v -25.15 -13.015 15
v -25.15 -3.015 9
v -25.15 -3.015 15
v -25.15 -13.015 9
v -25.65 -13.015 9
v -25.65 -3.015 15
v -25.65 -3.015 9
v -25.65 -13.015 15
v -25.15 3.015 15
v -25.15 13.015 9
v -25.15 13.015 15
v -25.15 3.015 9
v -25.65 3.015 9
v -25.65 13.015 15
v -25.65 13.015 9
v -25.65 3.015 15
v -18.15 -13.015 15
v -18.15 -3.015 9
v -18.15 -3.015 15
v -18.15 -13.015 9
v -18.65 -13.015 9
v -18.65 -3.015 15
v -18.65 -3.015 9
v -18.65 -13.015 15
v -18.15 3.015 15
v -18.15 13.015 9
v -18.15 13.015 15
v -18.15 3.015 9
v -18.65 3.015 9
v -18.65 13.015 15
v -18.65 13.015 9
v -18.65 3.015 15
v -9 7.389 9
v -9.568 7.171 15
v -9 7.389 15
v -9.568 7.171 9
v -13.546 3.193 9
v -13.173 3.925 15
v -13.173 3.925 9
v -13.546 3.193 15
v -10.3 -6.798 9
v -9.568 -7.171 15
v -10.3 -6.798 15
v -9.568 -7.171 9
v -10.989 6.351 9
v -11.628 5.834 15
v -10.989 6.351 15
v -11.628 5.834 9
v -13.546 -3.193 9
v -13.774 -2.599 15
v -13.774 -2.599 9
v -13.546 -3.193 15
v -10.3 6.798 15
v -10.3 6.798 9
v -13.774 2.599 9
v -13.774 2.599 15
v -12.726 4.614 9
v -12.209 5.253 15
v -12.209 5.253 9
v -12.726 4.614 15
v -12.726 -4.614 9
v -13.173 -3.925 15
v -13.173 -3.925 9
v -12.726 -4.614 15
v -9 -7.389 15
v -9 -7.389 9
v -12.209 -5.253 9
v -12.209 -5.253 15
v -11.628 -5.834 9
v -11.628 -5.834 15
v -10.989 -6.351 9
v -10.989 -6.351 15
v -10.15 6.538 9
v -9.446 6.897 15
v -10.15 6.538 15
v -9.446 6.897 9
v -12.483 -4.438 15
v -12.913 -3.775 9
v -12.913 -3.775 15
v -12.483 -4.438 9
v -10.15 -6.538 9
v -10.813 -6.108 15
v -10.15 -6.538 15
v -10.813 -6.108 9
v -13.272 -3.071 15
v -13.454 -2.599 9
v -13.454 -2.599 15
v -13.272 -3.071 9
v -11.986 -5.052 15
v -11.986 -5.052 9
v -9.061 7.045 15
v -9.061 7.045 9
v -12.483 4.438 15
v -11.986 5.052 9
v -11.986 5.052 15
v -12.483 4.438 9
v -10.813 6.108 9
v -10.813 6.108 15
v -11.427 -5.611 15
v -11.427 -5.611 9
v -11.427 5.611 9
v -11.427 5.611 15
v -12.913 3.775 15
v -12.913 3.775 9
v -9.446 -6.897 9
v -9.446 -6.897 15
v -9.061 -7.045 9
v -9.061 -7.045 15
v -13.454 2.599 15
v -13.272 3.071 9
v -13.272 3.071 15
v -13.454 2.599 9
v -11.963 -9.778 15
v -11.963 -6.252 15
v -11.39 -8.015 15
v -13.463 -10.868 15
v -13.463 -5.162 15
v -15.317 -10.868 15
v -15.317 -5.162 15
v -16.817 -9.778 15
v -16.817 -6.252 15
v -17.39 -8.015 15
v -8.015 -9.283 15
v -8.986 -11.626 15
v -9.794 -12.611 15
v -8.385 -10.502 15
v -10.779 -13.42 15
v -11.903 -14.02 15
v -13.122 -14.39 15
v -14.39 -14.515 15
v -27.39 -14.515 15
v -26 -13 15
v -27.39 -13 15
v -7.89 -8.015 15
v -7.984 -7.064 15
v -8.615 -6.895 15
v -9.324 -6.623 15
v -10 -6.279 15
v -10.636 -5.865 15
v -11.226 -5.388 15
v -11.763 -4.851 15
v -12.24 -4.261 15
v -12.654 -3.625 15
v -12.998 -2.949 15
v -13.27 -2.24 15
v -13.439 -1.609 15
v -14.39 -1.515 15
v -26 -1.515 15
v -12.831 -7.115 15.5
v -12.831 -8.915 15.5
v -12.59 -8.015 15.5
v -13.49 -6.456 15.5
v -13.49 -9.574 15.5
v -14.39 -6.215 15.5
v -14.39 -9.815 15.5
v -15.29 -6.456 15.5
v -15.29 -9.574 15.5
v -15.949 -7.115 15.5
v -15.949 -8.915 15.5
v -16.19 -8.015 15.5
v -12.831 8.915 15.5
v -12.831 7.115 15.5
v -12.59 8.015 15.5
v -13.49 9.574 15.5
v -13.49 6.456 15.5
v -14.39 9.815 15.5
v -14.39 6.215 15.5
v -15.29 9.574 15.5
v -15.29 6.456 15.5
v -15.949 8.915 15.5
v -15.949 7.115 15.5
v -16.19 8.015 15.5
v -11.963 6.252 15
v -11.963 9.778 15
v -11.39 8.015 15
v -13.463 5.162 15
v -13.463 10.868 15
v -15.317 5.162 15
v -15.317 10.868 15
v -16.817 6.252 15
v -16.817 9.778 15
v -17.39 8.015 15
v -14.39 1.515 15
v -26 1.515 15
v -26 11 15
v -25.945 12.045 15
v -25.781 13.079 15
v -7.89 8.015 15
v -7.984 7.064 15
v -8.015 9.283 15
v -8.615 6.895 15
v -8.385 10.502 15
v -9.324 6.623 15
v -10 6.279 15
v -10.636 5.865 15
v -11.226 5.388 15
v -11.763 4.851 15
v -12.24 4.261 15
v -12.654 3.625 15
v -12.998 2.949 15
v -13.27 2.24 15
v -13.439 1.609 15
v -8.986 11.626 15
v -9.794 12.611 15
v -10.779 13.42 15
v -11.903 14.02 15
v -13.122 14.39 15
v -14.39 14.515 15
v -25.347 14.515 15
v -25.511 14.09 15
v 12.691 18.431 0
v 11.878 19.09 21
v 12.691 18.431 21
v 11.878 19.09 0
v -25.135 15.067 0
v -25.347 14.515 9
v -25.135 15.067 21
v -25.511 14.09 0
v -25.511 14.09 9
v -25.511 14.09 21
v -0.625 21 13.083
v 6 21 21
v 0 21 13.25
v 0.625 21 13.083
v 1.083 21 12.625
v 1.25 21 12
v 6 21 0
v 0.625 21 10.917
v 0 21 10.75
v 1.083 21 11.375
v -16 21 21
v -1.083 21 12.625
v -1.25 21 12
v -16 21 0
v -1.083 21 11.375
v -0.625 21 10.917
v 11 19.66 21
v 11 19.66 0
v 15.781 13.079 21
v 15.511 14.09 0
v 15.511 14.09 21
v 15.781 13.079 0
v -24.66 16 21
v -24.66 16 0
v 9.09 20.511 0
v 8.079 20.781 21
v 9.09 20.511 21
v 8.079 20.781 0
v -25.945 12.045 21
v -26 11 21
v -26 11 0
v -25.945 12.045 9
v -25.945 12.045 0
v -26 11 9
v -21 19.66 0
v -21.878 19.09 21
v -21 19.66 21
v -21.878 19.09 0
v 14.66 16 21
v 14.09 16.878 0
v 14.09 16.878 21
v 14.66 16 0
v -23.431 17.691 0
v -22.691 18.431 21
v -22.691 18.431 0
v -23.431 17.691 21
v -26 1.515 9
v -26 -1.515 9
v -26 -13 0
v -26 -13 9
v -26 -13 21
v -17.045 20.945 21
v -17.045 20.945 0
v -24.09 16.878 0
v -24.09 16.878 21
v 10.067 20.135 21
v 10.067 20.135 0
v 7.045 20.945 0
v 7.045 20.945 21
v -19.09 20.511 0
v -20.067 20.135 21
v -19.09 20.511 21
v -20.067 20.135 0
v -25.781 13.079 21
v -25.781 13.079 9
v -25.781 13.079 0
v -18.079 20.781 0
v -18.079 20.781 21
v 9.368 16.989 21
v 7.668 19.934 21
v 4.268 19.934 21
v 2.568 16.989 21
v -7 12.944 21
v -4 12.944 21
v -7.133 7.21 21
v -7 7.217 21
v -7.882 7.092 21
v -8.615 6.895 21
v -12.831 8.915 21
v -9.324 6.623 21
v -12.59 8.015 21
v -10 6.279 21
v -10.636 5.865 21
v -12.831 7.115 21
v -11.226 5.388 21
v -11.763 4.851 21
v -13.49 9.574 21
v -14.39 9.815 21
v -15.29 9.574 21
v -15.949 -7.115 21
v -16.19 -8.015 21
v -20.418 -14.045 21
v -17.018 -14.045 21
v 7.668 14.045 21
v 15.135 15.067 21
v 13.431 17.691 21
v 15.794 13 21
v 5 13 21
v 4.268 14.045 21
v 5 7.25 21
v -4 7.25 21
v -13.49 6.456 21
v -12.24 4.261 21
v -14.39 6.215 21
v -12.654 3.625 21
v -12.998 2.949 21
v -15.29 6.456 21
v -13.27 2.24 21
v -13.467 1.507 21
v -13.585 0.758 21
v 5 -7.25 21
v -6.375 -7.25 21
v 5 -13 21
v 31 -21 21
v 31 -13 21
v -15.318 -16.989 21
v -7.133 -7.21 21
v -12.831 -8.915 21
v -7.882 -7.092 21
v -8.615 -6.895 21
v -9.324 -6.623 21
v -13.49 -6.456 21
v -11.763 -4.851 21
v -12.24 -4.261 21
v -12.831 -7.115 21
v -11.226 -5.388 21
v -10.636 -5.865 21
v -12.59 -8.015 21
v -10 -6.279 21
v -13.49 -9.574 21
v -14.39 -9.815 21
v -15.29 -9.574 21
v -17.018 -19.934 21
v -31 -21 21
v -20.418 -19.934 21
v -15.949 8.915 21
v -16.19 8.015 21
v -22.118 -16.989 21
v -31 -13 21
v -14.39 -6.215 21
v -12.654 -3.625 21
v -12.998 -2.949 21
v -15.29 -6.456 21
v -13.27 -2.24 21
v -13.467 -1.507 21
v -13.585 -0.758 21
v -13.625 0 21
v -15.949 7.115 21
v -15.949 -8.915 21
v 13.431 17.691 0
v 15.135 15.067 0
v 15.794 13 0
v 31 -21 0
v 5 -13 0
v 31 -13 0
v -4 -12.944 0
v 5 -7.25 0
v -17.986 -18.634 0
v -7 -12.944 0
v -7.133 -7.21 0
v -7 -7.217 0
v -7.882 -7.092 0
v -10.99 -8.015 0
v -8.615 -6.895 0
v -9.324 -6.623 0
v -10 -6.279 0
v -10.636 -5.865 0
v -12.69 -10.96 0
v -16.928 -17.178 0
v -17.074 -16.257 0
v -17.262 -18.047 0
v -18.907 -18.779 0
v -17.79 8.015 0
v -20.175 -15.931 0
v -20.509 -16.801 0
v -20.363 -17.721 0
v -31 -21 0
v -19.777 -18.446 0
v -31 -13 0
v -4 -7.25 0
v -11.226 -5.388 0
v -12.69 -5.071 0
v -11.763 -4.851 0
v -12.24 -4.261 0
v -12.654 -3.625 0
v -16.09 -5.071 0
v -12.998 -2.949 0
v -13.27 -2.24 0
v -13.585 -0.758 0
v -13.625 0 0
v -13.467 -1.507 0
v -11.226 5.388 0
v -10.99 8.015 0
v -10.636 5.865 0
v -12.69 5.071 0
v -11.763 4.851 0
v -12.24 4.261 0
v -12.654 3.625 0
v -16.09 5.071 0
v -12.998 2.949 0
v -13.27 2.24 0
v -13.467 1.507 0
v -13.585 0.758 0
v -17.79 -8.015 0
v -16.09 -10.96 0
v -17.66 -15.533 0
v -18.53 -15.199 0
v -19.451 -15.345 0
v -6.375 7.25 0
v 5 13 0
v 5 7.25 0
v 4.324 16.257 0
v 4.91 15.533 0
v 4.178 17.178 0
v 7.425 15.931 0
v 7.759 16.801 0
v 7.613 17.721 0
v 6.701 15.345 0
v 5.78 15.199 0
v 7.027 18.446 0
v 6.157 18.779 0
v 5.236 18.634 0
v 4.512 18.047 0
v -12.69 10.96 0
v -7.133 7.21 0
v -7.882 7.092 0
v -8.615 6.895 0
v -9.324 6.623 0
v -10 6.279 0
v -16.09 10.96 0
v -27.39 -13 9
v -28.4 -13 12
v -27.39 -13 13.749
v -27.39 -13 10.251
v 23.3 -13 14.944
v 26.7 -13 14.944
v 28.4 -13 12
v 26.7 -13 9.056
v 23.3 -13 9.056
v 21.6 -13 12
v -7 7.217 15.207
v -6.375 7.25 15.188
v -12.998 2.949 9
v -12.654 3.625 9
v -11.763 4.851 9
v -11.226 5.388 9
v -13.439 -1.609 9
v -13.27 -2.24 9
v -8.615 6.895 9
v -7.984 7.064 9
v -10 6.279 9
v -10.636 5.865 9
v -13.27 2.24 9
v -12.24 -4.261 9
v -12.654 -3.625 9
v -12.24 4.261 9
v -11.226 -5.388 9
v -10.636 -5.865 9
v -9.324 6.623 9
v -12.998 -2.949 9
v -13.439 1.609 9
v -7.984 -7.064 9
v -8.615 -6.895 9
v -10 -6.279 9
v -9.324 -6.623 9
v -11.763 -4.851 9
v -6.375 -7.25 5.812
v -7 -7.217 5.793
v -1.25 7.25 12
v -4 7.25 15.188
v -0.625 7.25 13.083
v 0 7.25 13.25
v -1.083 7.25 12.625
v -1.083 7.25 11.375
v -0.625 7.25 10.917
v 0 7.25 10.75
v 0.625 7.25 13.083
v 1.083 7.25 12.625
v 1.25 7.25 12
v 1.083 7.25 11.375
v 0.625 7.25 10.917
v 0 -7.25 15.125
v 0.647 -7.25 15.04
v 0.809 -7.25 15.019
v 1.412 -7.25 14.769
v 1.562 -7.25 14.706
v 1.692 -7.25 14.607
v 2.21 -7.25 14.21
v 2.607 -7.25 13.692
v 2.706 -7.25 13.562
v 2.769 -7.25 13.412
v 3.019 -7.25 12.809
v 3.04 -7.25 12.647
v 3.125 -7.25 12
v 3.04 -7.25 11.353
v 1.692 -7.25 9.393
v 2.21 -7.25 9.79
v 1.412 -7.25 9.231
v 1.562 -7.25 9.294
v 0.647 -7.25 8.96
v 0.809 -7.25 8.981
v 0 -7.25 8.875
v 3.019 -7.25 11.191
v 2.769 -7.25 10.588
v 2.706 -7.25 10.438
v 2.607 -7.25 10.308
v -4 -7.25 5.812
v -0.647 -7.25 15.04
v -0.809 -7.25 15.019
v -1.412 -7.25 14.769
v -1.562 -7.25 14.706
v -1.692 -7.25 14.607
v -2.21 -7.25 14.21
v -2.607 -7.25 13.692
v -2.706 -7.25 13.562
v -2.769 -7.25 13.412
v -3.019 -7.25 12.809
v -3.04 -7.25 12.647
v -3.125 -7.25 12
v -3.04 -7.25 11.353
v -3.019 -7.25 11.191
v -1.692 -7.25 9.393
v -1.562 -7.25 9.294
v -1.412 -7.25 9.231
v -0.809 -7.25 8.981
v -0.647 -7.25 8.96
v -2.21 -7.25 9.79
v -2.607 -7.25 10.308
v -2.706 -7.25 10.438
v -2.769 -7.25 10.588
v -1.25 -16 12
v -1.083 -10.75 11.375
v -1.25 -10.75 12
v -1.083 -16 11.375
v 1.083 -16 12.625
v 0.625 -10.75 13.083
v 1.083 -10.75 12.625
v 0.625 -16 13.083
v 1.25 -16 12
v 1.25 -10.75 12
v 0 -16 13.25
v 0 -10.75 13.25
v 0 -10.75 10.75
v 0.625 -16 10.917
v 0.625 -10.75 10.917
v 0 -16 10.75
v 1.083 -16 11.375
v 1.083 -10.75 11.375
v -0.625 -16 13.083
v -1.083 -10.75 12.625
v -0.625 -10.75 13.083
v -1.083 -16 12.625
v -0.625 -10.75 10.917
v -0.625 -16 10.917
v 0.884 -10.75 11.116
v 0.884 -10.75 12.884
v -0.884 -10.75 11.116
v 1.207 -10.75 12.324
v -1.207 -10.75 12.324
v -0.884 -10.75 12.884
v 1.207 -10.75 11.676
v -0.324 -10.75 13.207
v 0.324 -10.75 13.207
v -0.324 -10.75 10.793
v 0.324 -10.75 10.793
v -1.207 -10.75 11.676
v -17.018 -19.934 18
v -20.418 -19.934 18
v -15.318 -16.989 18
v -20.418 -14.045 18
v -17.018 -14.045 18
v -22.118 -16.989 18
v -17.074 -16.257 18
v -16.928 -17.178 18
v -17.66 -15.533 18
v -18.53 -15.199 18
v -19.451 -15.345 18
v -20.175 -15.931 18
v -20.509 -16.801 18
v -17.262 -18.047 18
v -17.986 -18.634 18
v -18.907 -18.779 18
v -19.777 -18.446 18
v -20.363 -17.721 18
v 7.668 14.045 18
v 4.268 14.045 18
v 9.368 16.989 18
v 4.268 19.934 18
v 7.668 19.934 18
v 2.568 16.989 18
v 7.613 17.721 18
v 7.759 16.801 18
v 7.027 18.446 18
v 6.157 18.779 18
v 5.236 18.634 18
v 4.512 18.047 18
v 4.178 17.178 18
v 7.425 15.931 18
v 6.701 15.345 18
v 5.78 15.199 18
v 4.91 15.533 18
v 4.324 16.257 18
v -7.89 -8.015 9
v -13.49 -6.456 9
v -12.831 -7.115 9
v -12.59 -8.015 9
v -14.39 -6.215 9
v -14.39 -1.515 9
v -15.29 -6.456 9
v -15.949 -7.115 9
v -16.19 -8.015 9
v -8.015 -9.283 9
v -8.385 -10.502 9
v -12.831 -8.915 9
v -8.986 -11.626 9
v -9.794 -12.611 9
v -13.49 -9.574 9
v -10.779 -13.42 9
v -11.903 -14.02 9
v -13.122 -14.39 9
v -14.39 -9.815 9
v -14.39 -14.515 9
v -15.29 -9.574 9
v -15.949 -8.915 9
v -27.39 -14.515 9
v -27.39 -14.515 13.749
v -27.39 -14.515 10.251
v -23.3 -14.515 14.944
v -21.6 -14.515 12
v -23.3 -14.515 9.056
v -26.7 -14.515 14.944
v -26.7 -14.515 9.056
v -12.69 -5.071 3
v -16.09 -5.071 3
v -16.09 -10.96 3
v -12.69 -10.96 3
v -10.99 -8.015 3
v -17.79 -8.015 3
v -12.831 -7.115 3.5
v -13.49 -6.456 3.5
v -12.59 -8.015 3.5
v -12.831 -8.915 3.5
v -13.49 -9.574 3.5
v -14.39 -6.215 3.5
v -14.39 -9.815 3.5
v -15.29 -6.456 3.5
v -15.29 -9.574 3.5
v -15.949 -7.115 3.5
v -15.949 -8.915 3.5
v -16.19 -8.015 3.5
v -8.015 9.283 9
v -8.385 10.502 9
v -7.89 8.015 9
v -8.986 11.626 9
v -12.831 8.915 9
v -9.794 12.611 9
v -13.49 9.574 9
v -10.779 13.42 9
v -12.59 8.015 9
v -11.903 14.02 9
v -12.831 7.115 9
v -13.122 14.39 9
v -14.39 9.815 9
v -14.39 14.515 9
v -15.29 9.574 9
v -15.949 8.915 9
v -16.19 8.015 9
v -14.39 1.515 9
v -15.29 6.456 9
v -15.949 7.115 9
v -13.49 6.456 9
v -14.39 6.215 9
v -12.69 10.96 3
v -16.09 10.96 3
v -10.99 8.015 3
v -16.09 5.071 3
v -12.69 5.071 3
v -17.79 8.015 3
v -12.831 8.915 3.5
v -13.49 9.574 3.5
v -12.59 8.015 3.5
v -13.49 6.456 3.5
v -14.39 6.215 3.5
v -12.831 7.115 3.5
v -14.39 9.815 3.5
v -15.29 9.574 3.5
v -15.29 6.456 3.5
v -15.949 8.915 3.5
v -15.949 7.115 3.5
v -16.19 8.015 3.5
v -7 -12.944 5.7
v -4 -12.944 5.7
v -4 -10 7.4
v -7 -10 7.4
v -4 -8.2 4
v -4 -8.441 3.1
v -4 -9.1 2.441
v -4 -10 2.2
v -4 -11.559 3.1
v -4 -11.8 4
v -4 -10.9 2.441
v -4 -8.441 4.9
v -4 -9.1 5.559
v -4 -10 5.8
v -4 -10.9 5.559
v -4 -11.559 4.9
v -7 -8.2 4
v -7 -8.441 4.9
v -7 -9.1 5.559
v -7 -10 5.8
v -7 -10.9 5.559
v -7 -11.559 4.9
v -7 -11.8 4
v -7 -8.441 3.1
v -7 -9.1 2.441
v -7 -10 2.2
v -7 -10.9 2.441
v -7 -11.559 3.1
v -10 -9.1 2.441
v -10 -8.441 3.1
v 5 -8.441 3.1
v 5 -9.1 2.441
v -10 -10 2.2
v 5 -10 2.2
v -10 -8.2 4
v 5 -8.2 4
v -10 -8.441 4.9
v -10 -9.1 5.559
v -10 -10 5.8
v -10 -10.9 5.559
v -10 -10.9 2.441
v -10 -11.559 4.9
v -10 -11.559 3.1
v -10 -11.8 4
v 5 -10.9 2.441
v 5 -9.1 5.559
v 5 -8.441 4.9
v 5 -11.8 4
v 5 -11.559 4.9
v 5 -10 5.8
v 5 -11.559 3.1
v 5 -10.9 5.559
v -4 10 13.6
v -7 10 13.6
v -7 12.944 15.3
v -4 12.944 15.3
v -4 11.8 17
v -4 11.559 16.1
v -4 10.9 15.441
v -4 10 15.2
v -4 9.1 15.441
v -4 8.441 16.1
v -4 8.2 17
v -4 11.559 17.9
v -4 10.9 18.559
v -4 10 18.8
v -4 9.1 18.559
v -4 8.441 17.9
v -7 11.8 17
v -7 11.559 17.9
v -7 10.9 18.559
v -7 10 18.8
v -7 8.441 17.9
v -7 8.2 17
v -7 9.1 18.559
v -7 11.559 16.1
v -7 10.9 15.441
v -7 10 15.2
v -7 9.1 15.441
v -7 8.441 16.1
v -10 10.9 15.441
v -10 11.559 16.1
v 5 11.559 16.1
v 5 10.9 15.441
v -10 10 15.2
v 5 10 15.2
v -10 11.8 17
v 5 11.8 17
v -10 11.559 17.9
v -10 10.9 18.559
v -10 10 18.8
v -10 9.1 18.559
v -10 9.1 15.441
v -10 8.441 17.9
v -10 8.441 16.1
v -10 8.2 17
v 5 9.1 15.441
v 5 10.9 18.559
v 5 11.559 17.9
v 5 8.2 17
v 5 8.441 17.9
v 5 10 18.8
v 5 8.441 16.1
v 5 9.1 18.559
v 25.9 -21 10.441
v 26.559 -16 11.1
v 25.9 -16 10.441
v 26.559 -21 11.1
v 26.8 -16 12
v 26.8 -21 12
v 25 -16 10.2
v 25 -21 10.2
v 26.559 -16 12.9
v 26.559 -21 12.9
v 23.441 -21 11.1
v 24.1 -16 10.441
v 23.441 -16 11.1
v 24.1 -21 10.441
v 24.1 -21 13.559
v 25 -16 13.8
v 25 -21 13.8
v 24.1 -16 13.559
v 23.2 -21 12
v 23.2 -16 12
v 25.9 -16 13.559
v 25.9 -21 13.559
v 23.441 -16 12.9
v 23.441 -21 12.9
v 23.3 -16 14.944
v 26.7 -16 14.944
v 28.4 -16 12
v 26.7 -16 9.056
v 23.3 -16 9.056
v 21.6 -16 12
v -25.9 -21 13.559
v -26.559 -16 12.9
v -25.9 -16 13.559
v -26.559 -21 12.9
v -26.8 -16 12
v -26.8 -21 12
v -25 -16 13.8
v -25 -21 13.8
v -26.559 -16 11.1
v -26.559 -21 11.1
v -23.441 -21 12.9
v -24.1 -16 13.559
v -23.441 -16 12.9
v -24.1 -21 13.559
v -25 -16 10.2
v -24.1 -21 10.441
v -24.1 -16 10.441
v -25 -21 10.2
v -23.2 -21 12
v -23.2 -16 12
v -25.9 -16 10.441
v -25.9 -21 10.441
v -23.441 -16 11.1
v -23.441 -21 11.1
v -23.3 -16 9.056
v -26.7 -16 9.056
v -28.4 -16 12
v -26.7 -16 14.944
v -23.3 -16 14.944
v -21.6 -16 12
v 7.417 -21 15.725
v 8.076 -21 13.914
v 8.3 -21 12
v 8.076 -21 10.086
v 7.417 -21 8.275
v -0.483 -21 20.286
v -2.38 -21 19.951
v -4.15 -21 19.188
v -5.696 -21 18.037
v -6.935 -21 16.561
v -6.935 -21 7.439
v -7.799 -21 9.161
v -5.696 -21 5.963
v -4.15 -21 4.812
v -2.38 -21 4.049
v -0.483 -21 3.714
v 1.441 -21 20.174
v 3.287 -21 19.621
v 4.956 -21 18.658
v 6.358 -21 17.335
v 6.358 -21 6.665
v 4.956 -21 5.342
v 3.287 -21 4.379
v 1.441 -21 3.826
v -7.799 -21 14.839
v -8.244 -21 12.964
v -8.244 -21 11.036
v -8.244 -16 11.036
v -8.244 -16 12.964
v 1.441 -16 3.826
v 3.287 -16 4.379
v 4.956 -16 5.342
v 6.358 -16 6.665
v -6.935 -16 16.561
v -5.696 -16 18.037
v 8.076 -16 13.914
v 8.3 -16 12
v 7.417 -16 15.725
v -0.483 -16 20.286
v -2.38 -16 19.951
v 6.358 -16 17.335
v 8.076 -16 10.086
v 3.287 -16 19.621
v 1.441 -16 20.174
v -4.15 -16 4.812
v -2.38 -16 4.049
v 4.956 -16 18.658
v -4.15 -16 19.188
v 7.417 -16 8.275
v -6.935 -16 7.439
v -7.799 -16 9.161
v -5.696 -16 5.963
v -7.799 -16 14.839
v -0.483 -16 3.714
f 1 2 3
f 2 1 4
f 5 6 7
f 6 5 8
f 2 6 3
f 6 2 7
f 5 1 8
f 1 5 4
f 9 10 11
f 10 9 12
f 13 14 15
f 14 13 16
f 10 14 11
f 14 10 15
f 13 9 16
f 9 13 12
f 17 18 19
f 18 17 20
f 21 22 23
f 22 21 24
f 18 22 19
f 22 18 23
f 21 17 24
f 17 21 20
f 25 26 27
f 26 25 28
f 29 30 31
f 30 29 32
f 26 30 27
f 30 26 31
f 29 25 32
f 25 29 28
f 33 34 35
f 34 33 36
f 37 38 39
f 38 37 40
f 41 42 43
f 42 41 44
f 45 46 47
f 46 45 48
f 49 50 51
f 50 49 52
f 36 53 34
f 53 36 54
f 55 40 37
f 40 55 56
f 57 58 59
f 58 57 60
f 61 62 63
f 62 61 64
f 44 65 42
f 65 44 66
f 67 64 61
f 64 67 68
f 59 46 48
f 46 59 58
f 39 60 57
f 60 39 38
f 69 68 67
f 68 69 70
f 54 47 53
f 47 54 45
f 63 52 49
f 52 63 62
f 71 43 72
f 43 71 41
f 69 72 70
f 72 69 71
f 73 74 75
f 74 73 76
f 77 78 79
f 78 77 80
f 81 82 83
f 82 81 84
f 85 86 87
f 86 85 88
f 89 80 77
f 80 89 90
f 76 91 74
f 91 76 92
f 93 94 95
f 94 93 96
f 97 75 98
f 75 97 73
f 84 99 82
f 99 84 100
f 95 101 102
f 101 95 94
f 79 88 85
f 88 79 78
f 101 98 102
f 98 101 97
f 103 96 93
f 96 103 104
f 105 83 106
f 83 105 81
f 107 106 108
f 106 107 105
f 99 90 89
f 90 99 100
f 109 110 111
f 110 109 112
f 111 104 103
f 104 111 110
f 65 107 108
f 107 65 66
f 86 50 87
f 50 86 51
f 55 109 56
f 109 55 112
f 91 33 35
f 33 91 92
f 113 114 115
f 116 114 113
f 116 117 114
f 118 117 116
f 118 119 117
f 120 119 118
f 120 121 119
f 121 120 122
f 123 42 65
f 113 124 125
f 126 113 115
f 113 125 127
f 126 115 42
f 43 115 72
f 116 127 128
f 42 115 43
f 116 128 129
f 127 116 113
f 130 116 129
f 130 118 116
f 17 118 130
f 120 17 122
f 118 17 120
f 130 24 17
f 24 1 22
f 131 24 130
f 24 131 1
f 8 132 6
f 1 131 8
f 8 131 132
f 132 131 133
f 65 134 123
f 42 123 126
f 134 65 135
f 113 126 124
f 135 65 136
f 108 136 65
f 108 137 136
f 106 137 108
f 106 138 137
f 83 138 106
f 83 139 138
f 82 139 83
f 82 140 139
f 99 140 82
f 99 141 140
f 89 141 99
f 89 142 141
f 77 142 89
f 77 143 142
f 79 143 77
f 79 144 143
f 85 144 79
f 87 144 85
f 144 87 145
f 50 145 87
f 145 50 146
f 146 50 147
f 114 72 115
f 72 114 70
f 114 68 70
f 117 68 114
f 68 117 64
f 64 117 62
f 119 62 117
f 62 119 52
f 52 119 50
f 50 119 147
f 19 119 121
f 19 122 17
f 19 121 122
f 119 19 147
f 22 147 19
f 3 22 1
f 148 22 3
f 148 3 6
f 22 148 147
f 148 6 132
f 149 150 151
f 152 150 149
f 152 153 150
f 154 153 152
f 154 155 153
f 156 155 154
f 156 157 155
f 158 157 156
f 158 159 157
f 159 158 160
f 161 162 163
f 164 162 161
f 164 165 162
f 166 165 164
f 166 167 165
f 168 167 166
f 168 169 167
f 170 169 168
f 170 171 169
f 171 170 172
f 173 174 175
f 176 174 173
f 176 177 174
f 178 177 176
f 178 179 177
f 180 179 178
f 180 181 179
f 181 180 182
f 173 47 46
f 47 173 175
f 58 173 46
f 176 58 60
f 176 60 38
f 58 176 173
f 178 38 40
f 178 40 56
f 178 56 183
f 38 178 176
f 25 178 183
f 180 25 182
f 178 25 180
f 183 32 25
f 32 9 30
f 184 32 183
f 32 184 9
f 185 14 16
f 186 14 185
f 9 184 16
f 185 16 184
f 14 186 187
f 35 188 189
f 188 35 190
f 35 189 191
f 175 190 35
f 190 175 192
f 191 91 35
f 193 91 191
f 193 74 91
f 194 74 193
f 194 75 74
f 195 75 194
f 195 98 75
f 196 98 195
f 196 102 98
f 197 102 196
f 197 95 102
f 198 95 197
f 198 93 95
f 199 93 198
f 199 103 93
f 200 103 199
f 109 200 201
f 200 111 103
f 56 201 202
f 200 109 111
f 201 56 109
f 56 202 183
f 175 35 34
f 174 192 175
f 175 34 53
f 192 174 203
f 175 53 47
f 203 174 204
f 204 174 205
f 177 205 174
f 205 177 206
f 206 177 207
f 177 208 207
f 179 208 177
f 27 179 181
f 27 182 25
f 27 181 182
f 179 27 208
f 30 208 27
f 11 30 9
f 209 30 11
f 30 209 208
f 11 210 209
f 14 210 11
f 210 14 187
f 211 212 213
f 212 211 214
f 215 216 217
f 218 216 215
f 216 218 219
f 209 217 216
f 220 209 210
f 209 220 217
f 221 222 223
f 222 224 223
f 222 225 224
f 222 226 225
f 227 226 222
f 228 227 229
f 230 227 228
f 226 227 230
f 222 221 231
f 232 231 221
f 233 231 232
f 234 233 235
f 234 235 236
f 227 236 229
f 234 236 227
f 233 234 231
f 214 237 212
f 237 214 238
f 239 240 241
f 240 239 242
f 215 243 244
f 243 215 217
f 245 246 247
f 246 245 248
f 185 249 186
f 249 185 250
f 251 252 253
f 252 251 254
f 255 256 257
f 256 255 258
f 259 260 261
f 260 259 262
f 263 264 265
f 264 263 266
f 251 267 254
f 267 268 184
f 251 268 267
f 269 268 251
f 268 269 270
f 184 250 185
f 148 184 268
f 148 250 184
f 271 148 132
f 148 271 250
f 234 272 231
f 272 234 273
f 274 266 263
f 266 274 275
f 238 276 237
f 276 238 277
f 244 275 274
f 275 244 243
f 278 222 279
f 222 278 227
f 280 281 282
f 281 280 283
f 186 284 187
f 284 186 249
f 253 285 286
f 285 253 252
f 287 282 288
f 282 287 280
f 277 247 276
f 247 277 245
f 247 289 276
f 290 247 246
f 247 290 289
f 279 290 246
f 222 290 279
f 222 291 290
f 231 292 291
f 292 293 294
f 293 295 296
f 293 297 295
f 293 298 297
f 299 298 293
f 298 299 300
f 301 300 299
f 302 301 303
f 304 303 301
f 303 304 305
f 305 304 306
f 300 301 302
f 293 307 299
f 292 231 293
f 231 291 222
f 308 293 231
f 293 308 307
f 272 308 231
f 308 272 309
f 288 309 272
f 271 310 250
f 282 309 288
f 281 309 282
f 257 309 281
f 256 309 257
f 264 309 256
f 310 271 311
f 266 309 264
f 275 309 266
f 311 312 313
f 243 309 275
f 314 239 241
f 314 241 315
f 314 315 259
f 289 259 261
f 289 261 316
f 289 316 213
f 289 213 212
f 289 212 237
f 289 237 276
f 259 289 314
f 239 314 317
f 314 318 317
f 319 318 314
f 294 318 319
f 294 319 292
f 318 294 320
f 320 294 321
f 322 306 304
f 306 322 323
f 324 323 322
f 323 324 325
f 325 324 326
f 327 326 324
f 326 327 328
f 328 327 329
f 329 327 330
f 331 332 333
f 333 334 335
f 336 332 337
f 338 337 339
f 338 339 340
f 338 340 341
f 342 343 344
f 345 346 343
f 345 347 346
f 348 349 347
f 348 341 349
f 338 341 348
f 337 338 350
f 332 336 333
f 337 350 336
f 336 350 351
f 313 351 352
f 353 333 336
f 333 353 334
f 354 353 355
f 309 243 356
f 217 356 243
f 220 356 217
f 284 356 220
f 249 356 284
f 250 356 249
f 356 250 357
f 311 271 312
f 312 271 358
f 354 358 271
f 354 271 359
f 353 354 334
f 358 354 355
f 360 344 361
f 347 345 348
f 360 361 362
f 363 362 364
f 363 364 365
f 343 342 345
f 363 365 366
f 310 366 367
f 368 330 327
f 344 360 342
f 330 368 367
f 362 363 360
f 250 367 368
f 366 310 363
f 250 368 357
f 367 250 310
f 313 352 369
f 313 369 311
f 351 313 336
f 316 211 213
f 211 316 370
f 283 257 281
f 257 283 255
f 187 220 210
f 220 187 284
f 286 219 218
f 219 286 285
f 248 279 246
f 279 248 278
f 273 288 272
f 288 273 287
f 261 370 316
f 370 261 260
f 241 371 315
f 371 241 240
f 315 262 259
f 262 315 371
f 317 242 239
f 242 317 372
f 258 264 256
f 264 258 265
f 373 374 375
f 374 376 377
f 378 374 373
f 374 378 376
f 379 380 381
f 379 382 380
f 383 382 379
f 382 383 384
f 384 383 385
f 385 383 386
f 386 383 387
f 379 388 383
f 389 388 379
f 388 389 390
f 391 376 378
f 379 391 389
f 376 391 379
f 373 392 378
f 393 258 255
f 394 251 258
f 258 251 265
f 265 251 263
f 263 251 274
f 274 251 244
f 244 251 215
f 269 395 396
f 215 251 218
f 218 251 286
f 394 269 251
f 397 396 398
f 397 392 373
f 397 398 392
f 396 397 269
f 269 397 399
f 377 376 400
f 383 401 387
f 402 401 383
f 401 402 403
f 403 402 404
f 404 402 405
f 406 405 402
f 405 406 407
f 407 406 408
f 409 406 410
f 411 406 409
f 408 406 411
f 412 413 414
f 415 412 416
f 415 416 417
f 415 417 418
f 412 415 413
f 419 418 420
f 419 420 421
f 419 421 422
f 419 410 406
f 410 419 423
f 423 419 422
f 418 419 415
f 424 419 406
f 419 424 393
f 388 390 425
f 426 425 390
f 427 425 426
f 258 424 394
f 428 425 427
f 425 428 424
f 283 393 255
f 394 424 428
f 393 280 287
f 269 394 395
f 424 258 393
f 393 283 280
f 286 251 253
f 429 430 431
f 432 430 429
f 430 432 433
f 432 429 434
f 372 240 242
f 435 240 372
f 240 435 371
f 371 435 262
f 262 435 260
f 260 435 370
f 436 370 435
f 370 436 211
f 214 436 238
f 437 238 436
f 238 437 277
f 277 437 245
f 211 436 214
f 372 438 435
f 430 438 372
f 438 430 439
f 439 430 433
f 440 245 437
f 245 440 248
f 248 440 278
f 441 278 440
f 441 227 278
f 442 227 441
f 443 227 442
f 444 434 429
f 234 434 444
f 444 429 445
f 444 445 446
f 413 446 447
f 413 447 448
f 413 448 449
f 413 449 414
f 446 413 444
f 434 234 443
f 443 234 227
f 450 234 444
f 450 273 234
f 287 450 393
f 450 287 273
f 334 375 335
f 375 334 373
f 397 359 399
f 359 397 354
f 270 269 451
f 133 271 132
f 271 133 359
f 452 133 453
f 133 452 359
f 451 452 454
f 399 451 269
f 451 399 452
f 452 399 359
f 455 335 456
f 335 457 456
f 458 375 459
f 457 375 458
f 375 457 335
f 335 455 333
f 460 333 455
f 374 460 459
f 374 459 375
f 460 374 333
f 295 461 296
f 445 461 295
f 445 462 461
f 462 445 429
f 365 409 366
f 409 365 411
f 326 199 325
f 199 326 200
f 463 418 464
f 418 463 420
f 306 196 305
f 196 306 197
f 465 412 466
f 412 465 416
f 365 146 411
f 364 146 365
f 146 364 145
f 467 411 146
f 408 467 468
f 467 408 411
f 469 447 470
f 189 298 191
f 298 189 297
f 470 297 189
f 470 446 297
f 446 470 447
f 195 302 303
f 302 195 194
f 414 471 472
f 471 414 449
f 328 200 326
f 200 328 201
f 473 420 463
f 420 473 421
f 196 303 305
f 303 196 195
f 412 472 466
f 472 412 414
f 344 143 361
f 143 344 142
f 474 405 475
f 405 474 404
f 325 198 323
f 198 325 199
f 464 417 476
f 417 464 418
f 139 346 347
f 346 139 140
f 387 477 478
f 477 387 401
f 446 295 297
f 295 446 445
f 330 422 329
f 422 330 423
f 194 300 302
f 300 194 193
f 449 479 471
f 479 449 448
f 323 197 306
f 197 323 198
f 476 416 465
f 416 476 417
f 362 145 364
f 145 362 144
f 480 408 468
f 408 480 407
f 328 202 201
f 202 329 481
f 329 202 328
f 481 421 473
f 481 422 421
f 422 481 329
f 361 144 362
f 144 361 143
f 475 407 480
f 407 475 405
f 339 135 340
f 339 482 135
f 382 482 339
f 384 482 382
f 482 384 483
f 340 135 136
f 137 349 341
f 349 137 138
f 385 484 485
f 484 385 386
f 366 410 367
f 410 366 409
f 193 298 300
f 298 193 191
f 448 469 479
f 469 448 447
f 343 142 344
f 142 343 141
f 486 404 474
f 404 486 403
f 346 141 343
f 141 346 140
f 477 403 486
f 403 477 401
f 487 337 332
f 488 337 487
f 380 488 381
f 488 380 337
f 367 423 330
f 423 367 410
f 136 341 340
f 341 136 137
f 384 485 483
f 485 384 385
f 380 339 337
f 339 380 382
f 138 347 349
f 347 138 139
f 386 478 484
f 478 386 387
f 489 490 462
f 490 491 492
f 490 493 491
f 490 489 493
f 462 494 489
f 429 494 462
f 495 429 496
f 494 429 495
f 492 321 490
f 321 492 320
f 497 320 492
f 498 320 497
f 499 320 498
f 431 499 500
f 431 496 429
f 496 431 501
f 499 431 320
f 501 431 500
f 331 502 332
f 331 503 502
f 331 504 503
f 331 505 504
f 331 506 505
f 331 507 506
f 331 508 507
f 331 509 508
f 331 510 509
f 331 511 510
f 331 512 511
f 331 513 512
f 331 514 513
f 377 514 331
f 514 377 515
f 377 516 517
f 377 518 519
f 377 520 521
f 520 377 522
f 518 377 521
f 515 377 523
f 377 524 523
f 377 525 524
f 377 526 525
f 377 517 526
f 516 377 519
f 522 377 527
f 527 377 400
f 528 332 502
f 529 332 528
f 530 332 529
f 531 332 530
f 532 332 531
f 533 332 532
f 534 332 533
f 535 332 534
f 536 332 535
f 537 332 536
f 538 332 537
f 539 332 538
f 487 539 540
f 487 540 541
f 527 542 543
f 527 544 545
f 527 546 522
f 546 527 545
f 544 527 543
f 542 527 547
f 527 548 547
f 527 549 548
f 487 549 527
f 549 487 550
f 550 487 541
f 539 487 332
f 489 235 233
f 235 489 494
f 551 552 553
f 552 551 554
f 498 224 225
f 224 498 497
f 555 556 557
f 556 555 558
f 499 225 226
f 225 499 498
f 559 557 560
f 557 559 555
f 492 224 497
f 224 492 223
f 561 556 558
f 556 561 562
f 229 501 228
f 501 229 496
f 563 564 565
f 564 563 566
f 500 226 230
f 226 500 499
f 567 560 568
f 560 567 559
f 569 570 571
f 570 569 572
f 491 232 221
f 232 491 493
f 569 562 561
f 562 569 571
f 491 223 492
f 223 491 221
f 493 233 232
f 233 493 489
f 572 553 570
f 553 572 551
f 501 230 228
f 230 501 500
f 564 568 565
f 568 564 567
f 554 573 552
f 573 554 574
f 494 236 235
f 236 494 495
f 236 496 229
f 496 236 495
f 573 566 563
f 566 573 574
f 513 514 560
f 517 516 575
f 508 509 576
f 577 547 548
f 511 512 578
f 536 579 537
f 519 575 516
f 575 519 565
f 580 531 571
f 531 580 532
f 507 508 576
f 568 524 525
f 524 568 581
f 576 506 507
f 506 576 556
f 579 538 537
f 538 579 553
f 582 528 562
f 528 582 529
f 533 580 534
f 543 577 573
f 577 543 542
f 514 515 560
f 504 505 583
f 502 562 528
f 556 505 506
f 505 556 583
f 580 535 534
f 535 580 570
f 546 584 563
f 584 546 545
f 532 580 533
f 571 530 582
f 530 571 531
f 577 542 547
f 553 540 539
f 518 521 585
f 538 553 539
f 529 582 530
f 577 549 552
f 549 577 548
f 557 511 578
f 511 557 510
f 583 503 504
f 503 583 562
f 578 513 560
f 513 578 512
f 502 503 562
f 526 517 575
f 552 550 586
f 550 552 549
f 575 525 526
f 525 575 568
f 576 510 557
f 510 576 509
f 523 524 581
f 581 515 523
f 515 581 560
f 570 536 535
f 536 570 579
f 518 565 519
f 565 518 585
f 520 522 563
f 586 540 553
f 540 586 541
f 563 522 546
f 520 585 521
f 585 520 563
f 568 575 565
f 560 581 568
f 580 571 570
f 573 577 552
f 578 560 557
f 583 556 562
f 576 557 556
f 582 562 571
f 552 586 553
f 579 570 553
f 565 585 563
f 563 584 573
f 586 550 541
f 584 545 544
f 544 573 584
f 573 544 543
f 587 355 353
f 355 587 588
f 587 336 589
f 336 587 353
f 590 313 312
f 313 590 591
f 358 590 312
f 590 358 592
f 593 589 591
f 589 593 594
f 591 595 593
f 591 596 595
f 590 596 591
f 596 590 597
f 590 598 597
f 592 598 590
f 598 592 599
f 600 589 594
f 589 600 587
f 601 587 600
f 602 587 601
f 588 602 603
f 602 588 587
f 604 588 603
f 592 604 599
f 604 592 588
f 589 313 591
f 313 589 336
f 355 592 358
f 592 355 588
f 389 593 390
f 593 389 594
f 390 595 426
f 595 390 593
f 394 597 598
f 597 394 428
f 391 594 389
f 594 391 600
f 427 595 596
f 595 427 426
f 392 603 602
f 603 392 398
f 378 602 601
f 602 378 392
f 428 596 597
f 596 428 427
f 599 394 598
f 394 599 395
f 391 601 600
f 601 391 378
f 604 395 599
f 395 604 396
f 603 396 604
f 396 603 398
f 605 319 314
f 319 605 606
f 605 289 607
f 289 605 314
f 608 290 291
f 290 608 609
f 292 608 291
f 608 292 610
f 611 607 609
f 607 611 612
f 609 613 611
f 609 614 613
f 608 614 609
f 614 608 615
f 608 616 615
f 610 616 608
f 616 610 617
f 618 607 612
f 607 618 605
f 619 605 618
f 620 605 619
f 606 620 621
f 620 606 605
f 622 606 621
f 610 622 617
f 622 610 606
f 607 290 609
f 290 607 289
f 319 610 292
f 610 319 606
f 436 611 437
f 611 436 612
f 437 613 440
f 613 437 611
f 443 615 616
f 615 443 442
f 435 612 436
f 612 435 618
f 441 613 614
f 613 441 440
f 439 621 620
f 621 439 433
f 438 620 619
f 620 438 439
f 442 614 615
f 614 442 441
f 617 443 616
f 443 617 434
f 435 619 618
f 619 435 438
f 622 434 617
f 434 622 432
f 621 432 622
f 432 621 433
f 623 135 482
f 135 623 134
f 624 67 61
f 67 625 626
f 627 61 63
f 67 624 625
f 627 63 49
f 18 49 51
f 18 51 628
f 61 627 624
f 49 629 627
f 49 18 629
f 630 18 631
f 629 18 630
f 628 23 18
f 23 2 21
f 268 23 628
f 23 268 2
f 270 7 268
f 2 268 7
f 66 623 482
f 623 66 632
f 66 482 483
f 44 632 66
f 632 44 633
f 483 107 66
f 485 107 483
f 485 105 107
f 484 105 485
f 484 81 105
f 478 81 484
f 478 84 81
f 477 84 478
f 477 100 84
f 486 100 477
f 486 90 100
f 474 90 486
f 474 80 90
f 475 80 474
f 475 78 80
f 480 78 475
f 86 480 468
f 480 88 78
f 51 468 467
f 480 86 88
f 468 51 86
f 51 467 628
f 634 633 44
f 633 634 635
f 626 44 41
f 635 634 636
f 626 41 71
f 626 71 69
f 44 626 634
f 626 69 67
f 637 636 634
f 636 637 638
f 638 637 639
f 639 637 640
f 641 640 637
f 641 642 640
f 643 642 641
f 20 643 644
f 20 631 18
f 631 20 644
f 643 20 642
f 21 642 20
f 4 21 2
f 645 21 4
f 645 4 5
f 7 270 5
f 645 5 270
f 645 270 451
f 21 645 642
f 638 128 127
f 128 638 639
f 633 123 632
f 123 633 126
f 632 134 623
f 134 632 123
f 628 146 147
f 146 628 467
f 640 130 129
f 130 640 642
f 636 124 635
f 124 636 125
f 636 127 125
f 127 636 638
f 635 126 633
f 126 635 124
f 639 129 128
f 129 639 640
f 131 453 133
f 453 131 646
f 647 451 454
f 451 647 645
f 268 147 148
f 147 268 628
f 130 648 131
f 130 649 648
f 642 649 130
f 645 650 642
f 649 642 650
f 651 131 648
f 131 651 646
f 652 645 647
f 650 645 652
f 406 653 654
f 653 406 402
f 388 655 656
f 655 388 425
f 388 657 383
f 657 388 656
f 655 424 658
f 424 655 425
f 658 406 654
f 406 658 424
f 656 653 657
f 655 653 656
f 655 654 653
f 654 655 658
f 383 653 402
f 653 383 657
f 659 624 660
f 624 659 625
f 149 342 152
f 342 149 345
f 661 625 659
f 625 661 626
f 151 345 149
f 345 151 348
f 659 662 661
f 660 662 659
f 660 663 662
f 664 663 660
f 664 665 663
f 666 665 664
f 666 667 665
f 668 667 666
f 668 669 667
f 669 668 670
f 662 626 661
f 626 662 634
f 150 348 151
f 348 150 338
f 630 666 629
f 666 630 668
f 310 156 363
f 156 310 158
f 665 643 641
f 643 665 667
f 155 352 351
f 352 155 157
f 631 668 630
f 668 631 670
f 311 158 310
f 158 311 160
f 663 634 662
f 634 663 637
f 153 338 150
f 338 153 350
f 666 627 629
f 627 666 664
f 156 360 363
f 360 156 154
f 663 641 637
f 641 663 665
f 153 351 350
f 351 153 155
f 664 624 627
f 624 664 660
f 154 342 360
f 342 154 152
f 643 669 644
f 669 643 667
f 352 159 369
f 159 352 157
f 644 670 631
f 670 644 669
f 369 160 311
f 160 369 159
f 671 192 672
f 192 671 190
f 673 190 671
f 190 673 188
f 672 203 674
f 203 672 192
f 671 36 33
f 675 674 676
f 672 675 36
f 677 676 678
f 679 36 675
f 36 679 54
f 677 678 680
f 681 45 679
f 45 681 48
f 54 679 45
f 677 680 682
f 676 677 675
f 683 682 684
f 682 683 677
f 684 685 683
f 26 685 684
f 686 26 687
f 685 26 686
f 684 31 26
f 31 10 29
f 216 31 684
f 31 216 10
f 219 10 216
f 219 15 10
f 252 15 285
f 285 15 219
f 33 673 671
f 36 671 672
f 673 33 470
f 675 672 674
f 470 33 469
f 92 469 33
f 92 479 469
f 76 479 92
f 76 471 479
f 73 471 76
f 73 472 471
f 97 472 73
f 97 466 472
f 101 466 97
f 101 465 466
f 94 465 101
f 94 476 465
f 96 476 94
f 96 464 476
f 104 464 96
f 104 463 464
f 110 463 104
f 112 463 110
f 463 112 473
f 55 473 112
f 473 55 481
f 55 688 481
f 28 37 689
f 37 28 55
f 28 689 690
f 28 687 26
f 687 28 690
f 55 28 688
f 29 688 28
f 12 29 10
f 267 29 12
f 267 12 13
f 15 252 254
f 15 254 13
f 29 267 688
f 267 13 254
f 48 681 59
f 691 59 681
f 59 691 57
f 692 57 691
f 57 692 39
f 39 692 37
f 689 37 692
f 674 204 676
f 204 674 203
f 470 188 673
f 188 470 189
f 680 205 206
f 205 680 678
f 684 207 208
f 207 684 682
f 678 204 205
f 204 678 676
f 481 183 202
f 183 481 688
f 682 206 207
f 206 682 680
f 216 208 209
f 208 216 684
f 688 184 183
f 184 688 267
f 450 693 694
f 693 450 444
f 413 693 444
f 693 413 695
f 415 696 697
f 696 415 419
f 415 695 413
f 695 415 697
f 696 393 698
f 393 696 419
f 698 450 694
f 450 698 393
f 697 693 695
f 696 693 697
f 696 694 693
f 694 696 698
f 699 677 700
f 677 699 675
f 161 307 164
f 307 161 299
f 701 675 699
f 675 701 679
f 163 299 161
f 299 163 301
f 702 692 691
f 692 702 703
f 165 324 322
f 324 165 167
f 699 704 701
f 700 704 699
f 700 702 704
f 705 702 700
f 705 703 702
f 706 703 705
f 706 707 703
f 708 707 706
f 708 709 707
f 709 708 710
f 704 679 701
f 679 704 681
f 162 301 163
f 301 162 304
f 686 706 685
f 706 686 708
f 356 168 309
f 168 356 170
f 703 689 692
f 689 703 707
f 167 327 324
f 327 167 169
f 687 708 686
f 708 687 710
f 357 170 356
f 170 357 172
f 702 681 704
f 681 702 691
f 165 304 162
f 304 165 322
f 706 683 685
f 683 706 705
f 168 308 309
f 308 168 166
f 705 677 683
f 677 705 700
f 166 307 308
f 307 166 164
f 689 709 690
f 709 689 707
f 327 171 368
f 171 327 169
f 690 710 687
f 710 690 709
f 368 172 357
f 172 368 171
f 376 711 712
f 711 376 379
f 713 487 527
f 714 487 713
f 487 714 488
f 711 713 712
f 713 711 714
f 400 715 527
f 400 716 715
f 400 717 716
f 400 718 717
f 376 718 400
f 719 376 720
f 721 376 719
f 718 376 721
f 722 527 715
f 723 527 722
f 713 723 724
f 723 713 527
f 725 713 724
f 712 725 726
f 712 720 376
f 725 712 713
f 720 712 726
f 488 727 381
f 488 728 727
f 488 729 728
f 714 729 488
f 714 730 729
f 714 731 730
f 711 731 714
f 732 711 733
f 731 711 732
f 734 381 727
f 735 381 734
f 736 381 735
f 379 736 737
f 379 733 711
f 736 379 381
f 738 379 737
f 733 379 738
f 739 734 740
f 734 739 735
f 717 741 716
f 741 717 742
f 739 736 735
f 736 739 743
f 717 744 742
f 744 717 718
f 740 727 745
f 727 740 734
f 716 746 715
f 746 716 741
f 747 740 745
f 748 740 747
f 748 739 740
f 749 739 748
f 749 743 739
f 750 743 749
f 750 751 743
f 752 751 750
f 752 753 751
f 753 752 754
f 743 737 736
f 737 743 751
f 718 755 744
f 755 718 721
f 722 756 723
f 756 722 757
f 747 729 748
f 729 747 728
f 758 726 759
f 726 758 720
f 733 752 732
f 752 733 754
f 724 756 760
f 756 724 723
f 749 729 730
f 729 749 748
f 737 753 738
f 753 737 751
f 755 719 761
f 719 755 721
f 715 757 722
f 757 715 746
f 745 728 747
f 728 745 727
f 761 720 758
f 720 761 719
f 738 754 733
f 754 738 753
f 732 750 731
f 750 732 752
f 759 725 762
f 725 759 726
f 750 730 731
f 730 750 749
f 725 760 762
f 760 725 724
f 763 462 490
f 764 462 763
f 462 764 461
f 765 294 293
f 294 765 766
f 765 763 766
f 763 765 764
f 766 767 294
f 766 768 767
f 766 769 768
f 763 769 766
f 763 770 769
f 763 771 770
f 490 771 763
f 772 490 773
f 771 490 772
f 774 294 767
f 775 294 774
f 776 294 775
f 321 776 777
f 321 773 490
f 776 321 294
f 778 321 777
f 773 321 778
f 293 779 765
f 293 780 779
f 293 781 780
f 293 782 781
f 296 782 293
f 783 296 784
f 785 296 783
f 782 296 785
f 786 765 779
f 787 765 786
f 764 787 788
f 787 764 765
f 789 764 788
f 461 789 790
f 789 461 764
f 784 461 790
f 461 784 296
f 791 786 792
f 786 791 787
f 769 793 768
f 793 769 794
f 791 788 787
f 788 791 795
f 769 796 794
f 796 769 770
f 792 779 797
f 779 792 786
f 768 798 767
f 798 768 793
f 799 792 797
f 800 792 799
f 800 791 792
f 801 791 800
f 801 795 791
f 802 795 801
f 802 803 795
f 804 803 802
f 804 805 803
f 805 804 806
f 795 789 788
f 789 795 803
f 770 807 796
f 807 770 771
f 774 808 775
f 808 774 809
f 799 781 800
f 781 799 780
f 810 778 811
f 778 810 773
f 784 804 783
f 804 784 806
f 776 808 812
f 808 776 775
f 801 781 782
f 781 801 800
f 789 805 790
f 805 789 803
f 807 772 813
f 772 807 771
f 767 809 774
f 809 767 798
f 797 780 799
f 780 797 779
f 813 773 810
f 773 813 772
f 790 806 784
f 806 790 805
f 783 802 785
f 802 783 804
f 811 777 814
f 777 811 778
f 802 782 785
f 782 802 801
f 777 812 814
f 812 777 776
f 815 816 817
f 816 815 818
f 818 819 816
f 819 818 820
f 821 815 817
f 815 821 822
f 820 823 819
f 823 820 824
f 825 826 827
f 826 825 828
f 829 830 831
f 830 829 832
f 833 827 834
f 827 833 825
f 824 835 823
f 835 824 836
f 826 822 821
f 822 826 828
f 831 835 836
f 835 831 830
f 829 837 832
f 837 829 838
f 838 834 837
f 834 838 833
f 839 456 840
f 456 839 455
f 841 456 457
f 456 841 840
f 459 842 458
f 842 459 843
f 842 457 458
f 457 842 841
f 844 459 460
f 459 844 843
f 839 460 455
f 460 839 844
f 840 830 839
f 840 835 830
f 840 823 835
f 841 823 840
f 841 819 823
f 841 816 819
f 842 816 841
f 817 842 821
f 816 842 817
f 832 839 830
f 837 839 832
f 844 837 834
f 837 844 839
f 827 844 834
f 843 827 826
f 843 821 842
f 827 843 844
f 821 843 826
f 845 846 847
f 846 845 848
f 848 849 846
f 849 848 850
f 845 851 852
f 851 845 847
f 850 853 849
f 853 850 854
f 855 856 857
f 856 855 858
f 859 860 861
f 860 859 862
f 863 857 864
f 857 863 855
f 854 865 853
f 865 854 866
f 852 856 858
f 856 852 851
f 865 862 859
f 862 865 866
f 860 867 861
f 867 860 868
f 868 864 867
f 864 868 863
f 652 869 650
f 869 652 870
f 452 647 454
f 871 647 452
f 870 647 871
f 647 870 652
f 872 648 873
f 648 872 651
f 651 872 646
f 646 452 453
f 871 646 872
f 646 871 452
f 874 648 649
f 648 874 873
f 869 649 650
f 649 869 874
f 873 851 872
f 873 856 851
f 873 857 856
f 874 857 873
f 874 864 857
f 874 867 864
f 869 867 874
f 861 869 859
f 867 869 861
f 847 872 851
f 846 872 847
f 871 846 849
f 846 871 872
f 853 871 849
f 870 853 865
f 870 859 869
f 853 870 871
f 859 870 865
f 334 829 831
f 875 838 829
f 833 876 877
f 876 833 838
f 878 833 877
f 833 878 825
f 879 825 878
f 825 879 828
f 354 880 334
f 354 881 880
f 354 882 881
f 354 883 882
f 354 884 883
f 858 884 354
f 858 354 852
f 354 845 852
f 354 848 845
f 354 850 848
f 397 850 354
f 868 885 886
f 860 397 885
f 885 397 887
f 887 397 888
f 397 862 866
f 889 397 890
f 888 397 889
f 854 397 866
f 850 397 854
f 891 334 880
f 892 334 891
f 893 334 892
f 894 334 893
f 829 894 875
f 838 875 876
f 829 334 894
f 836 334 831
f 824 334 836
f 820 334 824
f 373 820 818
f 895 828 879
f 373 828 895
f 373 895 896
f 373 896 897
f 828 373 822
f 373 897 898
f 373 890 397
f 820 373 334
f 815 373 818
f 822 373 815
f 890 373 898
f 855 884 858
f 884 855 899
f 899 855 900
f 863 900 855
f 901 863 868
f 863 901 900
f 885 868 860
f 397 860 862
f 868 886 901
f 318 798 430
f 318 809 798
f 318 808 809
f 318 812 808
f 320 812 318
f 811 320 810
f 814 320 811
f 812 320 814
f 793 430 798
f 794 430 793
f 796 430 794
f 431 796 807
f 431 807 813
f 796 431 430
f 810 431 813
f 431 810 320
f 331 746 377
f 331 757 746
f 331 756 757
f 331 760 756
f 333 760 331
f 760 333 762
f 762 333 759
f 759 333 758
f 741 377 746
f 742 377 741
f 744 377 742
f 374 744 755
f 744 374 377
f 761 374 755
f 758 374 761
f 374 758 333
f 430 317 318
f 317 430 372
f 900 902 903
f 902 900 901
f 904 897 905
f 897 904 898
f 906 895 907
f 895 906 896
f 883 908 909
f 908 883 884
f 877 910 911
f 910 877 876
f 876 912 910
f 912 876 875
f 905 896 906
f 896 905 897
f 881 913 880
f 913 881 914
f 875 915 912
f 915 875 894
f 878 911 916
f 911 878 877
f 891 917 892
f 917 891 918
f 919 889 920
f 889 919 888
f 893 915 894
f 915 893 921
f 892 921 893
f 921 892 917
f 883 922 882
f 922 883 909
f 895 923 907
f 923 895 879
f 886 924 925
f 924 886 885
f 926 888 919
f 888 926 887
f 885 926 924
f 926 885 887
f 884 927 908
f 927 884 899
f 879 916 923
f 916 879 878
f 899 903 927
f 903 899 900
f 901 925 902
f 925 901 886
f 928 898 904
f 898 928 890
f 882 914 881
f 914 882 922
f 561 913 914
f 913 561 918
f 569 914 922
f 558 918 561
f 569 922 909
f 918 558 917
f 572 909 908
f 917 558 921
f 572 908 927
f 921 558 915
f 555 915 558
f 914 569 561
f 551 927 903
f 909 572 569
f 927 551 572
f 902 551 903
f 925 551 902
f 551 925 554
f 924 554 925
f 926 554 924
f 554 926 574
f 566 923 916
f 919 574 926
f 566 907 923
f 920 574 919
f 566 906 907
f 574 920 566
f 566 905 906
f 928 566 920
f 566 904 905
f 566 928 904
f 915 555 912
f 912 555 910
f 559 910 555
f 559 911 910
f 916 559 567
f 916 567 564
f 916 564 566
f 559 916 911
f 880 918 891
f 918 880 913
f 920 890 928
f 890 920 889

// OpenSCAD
// Based on MendelMax J-Head Micro-Extruder V5 by Ultibots:
// http://www.thingiverse.com/thing:42112
//
// Completely rewritten in OpenSCAD by Johann on 2013-01-19.

bearing_id = 3; // 623zz bearings are 3x10x4mm.
bearing_od = 10;
bearing_width = 4;
bearing_offset = 1.5;

body_height = 42;
body_width = 42; // V5: 52mm.
body_offset = 5; // V5: 7mm.
body_thickness = 21;
body_roundness = 10;

groovemount_od = 16.6; // 16mm nominal.
groovemount_height = 5; // Must push down on GrooveMount.

filament_offset = 1.5;
filament_dia = 1.75; // This is for 1.75mm filament.
filament_hole_dia = 2.5; // Size of opening into and out of the extruder.
filament_squish = 0.0; // Distance the drive gear teeth press into the filament.

// Measured drive gear sizes, sample size of one each (brandonheller):
// Trinity Labs hobbed pulley: 12.66mm od, 11mm valley od
// TriDPrinting hobbed pulley: 12.68mm od, 10.56mm valley od
// Make sure to set these, to reduce friction from twisting the filament, as well as ensure that the drive gear bearings actually rest against the drive gear.
drive_gear_width = 12;
drive_gear_id = 5;
drive_gear_od = 12.67;
drive_gear_valley_od = 11; // Diameter of drive gear at the valley of the teeth.
drive_gear_offset = drive_gear_valley_od/2+filament_dia/2-filament_squish;  // Was: 7

cutout_id = 14.5;
cutout_height = 26;

funnel_depth = 7;
funnel_entrance_dia = 5;

foot_width = 62;
foot_offset = 0; // V5: 2mm but most GrooveMount plates are centered.

motor_mount_radius = 21;
motor_mount_angle = 54;

m3_radius = 1.8;
m3_nut_radius = 3.4;
m3_nut_height = 3;

m4_radius = 2.3;
m4_nut_radius = 4.5;
m4_nut_width = 7.5;
m4_nut_height = 4;

idler_x = -5.5;
idler_y = 10;
idler_z = 6.5;

// Place the two drive gear support bearings:
//  - tangent to the drive gear
//  - 90 degrees apart
//  - 45 degrees rotated up or down from bottom of extruder.
bearing_drive_gear_offset = drive_gear_od/2+bearing_od/2;
bearing_drive_gear_offset_x_y = bearing_drive_gear_offset*(sqrt(2)/2);
bearing_x = bearing_drive_gear_offset_x_y+drive_gear_offset; // Was: 15.5
bearing_y = bearing_drive_gear_offset_x_y; // Was: 7.5

module pg35l_extruder() {
  union() {
    // Single wall support surfaces, to be removed after printing.
    for (x = [-body_width/2, -body_width/3]) {
      for (y = [-bearing_y, bearing_y]) {
	translate([x-body_offset+0.6, y, bearing_offset])
	  cube([0.5, bearing_od, body_thickness*2/3], center=true);
      }
    }
    intersection() {
      translate([-drive_gear_offset, 0, 0]) difference() {
        cylinder(r=cutout_id/2+0.6, h=body_thickness-2, center=true, $fn=60);
        cylinder(r=cutout_id/2+0.3, h=body_thickness-1, center=true, $fn=60);
      }
      union() {
        for (y = [-bearing_y, bearing_y]) {
	  translate([-bearing_x, y, bearing_offset]) {
	    cylinder(r=bearing_od/2+0.5, h=body_thickness/2, center=true);
	    // Drive gear support bearings
	    % cylinder(r=bearing_od/2, h=bearing_width, center=true);
	  }
	}
      }
    }
    // Bridge M3 screw holes above bearing spaces.
    for (y = [-bearing_y, bearing_y]) {
      translate([-bearing_x, y, bearing_offset+bearing_width/2+1.25]) {
	cylinder(r=3, h=0.5, center=true);
      }
    }
    difference() {
      union() {
	// Rounded top.
	translate([-body_offset, -body_roundness, 0]) minkowski() {
	  cube([body_width-2*body_roundness, body_height, body_thickness-1],
	       center=true);
	  cylinder(r=body_roundness, h=1, center=true, $fn=60);
	}
	// Foot.
	translate([-foot_offset, -body_height/2, 0])
	  cube([foot_width, 16, body_thickness], center=true);
      }
      // Uncomment the following line to look inside.
      // translate([-30, 0, 16]) cube([60, 30, 30], center=true);
      // Flat bottom.
      translate([0, -body_height/2-20, 0])
	cube([2*body_width, 40, body_thickness+1], center=true);
      // Drive gear cutout.
      translate([-drive_gear_offset, 0, 0]) {
	cylinder(r=cutout_id/2, h=body_thickness+1, center=true, $fn=60);
	translate([20, 0, 0])
	  cube([40, cutout_id, body_thickness+1], center=true);
      }
      // Idler cutout.
      translate([25, 0, 0])
	cube([40, cutout_height, body_thickness+1], center=true);
      // Filament path and funnel.
      translate([0, 0, filament_offset]) rotate([90, 0, 0]) {
	// Filament cutout.
       cylinder(r=filament_hole_dia/2, h=2*body_height, center=true, $fn=12);
       // Filament funnel.
	translate([0, 0, cutout_id/2])
         cylinder(r1=funnel_entrance_dia, r2=filament_hole_dia/2, h=funnel_depth,
		   center=true, $fn=24);
      }
      // Motor mount screws.
      translate([-drive_gear_offset, 0, 0])
      for (x = [-motor_mount_radius, motor_mount_radius]) {
	rotate([0, 0, motor_mount_angle])
	  translate([x, 0, body_thickness/2-m3_nut_height]) {
	  rotate([0, 0, -motor_mount_angle])
	    #cylinder(r=m3_nut_radius, h=m3_nut_height*2, $fn=6);
	  translate([0, 0, 0.5]) rotate([180, 0, 0])
	    cylinder(r=m3_radius, h=body_thickness, $fn=12);
	}
      }
      // Bearing spaces and mount screws.
      for (y = [-bearing_y, bearing_y]) {
	translate([-bearing_x, y, bearing_offset]) {
	  cylinder(r=(bearing_od+3)/2, h=bearing_width+2, center=true, $fn=32);
	  translate([-6.5, 0, 0])
	    cube([13, bearing_od+3, bearing_width+2], center=true);
	}
	translate([-bearing_x, y, m3_nut_height-body_thickness/2]) {
	  rotate([180, 0, 0])
	    cylinder(r=m3_nut_radius, h=m3_nut_height*2, $fn=6);
	  translate([0, 0, 0.5])
	    cylinder(r=m3_radius, h=body_thickness, $fn=12);
	}
      }
      // Idler screws.
      for (i = [-1, 1]) {
	translate([0, i*idler_y, i*idler_z]) rotate([0, 90, 0]) {
	  cylinder(r=m3_radius, h=20, center=true, $fn=12);
	  for (x = [0, -3*i])
	    translate([x, 0, idler_x])
	      cylinder(r=m3_nut_radius, h=m3_nut_height, center=true, $fn=6);
	}
      }
      // Foot mounting screws and nut pockets.
      translate([-foot_offset, 5-body_height/2, filament_offset])
      for (a = [0, 180]) {
	rotate([-90, a, 0]) translate([25, 0, 0]) {
	  cylinder(r=m3_radius, h=13, center=true, $fn=12);
	  cylinder(r=m3_nut_radius, h=7, $fn=6);
	}
      }
      // Groove mount.
      translate([0, -body_height/2, filament_offset]) rotate([90, 0, 0])
	cylinder(r=groovemount_od/2, h=2*groovemount_height, center=true);
    }
  }
  // Drive gear.
  % translate([-drive_gear_offset, 0, 0]) difference() {
    cylinder(r=drive_gear_od/2, h=drive_gear_width, center=true);
    cylinder(r=drive_gear_id/2, h=drive_gear_width+1, center=true, $fn=12);
  }
}

translate([0, 0, body_thickness/2]) pg35l_extruder();

// Uncomment the following line for reference.
// translate([2, -21, 0]) % import("me_body_v5.1_3mm.stl");
